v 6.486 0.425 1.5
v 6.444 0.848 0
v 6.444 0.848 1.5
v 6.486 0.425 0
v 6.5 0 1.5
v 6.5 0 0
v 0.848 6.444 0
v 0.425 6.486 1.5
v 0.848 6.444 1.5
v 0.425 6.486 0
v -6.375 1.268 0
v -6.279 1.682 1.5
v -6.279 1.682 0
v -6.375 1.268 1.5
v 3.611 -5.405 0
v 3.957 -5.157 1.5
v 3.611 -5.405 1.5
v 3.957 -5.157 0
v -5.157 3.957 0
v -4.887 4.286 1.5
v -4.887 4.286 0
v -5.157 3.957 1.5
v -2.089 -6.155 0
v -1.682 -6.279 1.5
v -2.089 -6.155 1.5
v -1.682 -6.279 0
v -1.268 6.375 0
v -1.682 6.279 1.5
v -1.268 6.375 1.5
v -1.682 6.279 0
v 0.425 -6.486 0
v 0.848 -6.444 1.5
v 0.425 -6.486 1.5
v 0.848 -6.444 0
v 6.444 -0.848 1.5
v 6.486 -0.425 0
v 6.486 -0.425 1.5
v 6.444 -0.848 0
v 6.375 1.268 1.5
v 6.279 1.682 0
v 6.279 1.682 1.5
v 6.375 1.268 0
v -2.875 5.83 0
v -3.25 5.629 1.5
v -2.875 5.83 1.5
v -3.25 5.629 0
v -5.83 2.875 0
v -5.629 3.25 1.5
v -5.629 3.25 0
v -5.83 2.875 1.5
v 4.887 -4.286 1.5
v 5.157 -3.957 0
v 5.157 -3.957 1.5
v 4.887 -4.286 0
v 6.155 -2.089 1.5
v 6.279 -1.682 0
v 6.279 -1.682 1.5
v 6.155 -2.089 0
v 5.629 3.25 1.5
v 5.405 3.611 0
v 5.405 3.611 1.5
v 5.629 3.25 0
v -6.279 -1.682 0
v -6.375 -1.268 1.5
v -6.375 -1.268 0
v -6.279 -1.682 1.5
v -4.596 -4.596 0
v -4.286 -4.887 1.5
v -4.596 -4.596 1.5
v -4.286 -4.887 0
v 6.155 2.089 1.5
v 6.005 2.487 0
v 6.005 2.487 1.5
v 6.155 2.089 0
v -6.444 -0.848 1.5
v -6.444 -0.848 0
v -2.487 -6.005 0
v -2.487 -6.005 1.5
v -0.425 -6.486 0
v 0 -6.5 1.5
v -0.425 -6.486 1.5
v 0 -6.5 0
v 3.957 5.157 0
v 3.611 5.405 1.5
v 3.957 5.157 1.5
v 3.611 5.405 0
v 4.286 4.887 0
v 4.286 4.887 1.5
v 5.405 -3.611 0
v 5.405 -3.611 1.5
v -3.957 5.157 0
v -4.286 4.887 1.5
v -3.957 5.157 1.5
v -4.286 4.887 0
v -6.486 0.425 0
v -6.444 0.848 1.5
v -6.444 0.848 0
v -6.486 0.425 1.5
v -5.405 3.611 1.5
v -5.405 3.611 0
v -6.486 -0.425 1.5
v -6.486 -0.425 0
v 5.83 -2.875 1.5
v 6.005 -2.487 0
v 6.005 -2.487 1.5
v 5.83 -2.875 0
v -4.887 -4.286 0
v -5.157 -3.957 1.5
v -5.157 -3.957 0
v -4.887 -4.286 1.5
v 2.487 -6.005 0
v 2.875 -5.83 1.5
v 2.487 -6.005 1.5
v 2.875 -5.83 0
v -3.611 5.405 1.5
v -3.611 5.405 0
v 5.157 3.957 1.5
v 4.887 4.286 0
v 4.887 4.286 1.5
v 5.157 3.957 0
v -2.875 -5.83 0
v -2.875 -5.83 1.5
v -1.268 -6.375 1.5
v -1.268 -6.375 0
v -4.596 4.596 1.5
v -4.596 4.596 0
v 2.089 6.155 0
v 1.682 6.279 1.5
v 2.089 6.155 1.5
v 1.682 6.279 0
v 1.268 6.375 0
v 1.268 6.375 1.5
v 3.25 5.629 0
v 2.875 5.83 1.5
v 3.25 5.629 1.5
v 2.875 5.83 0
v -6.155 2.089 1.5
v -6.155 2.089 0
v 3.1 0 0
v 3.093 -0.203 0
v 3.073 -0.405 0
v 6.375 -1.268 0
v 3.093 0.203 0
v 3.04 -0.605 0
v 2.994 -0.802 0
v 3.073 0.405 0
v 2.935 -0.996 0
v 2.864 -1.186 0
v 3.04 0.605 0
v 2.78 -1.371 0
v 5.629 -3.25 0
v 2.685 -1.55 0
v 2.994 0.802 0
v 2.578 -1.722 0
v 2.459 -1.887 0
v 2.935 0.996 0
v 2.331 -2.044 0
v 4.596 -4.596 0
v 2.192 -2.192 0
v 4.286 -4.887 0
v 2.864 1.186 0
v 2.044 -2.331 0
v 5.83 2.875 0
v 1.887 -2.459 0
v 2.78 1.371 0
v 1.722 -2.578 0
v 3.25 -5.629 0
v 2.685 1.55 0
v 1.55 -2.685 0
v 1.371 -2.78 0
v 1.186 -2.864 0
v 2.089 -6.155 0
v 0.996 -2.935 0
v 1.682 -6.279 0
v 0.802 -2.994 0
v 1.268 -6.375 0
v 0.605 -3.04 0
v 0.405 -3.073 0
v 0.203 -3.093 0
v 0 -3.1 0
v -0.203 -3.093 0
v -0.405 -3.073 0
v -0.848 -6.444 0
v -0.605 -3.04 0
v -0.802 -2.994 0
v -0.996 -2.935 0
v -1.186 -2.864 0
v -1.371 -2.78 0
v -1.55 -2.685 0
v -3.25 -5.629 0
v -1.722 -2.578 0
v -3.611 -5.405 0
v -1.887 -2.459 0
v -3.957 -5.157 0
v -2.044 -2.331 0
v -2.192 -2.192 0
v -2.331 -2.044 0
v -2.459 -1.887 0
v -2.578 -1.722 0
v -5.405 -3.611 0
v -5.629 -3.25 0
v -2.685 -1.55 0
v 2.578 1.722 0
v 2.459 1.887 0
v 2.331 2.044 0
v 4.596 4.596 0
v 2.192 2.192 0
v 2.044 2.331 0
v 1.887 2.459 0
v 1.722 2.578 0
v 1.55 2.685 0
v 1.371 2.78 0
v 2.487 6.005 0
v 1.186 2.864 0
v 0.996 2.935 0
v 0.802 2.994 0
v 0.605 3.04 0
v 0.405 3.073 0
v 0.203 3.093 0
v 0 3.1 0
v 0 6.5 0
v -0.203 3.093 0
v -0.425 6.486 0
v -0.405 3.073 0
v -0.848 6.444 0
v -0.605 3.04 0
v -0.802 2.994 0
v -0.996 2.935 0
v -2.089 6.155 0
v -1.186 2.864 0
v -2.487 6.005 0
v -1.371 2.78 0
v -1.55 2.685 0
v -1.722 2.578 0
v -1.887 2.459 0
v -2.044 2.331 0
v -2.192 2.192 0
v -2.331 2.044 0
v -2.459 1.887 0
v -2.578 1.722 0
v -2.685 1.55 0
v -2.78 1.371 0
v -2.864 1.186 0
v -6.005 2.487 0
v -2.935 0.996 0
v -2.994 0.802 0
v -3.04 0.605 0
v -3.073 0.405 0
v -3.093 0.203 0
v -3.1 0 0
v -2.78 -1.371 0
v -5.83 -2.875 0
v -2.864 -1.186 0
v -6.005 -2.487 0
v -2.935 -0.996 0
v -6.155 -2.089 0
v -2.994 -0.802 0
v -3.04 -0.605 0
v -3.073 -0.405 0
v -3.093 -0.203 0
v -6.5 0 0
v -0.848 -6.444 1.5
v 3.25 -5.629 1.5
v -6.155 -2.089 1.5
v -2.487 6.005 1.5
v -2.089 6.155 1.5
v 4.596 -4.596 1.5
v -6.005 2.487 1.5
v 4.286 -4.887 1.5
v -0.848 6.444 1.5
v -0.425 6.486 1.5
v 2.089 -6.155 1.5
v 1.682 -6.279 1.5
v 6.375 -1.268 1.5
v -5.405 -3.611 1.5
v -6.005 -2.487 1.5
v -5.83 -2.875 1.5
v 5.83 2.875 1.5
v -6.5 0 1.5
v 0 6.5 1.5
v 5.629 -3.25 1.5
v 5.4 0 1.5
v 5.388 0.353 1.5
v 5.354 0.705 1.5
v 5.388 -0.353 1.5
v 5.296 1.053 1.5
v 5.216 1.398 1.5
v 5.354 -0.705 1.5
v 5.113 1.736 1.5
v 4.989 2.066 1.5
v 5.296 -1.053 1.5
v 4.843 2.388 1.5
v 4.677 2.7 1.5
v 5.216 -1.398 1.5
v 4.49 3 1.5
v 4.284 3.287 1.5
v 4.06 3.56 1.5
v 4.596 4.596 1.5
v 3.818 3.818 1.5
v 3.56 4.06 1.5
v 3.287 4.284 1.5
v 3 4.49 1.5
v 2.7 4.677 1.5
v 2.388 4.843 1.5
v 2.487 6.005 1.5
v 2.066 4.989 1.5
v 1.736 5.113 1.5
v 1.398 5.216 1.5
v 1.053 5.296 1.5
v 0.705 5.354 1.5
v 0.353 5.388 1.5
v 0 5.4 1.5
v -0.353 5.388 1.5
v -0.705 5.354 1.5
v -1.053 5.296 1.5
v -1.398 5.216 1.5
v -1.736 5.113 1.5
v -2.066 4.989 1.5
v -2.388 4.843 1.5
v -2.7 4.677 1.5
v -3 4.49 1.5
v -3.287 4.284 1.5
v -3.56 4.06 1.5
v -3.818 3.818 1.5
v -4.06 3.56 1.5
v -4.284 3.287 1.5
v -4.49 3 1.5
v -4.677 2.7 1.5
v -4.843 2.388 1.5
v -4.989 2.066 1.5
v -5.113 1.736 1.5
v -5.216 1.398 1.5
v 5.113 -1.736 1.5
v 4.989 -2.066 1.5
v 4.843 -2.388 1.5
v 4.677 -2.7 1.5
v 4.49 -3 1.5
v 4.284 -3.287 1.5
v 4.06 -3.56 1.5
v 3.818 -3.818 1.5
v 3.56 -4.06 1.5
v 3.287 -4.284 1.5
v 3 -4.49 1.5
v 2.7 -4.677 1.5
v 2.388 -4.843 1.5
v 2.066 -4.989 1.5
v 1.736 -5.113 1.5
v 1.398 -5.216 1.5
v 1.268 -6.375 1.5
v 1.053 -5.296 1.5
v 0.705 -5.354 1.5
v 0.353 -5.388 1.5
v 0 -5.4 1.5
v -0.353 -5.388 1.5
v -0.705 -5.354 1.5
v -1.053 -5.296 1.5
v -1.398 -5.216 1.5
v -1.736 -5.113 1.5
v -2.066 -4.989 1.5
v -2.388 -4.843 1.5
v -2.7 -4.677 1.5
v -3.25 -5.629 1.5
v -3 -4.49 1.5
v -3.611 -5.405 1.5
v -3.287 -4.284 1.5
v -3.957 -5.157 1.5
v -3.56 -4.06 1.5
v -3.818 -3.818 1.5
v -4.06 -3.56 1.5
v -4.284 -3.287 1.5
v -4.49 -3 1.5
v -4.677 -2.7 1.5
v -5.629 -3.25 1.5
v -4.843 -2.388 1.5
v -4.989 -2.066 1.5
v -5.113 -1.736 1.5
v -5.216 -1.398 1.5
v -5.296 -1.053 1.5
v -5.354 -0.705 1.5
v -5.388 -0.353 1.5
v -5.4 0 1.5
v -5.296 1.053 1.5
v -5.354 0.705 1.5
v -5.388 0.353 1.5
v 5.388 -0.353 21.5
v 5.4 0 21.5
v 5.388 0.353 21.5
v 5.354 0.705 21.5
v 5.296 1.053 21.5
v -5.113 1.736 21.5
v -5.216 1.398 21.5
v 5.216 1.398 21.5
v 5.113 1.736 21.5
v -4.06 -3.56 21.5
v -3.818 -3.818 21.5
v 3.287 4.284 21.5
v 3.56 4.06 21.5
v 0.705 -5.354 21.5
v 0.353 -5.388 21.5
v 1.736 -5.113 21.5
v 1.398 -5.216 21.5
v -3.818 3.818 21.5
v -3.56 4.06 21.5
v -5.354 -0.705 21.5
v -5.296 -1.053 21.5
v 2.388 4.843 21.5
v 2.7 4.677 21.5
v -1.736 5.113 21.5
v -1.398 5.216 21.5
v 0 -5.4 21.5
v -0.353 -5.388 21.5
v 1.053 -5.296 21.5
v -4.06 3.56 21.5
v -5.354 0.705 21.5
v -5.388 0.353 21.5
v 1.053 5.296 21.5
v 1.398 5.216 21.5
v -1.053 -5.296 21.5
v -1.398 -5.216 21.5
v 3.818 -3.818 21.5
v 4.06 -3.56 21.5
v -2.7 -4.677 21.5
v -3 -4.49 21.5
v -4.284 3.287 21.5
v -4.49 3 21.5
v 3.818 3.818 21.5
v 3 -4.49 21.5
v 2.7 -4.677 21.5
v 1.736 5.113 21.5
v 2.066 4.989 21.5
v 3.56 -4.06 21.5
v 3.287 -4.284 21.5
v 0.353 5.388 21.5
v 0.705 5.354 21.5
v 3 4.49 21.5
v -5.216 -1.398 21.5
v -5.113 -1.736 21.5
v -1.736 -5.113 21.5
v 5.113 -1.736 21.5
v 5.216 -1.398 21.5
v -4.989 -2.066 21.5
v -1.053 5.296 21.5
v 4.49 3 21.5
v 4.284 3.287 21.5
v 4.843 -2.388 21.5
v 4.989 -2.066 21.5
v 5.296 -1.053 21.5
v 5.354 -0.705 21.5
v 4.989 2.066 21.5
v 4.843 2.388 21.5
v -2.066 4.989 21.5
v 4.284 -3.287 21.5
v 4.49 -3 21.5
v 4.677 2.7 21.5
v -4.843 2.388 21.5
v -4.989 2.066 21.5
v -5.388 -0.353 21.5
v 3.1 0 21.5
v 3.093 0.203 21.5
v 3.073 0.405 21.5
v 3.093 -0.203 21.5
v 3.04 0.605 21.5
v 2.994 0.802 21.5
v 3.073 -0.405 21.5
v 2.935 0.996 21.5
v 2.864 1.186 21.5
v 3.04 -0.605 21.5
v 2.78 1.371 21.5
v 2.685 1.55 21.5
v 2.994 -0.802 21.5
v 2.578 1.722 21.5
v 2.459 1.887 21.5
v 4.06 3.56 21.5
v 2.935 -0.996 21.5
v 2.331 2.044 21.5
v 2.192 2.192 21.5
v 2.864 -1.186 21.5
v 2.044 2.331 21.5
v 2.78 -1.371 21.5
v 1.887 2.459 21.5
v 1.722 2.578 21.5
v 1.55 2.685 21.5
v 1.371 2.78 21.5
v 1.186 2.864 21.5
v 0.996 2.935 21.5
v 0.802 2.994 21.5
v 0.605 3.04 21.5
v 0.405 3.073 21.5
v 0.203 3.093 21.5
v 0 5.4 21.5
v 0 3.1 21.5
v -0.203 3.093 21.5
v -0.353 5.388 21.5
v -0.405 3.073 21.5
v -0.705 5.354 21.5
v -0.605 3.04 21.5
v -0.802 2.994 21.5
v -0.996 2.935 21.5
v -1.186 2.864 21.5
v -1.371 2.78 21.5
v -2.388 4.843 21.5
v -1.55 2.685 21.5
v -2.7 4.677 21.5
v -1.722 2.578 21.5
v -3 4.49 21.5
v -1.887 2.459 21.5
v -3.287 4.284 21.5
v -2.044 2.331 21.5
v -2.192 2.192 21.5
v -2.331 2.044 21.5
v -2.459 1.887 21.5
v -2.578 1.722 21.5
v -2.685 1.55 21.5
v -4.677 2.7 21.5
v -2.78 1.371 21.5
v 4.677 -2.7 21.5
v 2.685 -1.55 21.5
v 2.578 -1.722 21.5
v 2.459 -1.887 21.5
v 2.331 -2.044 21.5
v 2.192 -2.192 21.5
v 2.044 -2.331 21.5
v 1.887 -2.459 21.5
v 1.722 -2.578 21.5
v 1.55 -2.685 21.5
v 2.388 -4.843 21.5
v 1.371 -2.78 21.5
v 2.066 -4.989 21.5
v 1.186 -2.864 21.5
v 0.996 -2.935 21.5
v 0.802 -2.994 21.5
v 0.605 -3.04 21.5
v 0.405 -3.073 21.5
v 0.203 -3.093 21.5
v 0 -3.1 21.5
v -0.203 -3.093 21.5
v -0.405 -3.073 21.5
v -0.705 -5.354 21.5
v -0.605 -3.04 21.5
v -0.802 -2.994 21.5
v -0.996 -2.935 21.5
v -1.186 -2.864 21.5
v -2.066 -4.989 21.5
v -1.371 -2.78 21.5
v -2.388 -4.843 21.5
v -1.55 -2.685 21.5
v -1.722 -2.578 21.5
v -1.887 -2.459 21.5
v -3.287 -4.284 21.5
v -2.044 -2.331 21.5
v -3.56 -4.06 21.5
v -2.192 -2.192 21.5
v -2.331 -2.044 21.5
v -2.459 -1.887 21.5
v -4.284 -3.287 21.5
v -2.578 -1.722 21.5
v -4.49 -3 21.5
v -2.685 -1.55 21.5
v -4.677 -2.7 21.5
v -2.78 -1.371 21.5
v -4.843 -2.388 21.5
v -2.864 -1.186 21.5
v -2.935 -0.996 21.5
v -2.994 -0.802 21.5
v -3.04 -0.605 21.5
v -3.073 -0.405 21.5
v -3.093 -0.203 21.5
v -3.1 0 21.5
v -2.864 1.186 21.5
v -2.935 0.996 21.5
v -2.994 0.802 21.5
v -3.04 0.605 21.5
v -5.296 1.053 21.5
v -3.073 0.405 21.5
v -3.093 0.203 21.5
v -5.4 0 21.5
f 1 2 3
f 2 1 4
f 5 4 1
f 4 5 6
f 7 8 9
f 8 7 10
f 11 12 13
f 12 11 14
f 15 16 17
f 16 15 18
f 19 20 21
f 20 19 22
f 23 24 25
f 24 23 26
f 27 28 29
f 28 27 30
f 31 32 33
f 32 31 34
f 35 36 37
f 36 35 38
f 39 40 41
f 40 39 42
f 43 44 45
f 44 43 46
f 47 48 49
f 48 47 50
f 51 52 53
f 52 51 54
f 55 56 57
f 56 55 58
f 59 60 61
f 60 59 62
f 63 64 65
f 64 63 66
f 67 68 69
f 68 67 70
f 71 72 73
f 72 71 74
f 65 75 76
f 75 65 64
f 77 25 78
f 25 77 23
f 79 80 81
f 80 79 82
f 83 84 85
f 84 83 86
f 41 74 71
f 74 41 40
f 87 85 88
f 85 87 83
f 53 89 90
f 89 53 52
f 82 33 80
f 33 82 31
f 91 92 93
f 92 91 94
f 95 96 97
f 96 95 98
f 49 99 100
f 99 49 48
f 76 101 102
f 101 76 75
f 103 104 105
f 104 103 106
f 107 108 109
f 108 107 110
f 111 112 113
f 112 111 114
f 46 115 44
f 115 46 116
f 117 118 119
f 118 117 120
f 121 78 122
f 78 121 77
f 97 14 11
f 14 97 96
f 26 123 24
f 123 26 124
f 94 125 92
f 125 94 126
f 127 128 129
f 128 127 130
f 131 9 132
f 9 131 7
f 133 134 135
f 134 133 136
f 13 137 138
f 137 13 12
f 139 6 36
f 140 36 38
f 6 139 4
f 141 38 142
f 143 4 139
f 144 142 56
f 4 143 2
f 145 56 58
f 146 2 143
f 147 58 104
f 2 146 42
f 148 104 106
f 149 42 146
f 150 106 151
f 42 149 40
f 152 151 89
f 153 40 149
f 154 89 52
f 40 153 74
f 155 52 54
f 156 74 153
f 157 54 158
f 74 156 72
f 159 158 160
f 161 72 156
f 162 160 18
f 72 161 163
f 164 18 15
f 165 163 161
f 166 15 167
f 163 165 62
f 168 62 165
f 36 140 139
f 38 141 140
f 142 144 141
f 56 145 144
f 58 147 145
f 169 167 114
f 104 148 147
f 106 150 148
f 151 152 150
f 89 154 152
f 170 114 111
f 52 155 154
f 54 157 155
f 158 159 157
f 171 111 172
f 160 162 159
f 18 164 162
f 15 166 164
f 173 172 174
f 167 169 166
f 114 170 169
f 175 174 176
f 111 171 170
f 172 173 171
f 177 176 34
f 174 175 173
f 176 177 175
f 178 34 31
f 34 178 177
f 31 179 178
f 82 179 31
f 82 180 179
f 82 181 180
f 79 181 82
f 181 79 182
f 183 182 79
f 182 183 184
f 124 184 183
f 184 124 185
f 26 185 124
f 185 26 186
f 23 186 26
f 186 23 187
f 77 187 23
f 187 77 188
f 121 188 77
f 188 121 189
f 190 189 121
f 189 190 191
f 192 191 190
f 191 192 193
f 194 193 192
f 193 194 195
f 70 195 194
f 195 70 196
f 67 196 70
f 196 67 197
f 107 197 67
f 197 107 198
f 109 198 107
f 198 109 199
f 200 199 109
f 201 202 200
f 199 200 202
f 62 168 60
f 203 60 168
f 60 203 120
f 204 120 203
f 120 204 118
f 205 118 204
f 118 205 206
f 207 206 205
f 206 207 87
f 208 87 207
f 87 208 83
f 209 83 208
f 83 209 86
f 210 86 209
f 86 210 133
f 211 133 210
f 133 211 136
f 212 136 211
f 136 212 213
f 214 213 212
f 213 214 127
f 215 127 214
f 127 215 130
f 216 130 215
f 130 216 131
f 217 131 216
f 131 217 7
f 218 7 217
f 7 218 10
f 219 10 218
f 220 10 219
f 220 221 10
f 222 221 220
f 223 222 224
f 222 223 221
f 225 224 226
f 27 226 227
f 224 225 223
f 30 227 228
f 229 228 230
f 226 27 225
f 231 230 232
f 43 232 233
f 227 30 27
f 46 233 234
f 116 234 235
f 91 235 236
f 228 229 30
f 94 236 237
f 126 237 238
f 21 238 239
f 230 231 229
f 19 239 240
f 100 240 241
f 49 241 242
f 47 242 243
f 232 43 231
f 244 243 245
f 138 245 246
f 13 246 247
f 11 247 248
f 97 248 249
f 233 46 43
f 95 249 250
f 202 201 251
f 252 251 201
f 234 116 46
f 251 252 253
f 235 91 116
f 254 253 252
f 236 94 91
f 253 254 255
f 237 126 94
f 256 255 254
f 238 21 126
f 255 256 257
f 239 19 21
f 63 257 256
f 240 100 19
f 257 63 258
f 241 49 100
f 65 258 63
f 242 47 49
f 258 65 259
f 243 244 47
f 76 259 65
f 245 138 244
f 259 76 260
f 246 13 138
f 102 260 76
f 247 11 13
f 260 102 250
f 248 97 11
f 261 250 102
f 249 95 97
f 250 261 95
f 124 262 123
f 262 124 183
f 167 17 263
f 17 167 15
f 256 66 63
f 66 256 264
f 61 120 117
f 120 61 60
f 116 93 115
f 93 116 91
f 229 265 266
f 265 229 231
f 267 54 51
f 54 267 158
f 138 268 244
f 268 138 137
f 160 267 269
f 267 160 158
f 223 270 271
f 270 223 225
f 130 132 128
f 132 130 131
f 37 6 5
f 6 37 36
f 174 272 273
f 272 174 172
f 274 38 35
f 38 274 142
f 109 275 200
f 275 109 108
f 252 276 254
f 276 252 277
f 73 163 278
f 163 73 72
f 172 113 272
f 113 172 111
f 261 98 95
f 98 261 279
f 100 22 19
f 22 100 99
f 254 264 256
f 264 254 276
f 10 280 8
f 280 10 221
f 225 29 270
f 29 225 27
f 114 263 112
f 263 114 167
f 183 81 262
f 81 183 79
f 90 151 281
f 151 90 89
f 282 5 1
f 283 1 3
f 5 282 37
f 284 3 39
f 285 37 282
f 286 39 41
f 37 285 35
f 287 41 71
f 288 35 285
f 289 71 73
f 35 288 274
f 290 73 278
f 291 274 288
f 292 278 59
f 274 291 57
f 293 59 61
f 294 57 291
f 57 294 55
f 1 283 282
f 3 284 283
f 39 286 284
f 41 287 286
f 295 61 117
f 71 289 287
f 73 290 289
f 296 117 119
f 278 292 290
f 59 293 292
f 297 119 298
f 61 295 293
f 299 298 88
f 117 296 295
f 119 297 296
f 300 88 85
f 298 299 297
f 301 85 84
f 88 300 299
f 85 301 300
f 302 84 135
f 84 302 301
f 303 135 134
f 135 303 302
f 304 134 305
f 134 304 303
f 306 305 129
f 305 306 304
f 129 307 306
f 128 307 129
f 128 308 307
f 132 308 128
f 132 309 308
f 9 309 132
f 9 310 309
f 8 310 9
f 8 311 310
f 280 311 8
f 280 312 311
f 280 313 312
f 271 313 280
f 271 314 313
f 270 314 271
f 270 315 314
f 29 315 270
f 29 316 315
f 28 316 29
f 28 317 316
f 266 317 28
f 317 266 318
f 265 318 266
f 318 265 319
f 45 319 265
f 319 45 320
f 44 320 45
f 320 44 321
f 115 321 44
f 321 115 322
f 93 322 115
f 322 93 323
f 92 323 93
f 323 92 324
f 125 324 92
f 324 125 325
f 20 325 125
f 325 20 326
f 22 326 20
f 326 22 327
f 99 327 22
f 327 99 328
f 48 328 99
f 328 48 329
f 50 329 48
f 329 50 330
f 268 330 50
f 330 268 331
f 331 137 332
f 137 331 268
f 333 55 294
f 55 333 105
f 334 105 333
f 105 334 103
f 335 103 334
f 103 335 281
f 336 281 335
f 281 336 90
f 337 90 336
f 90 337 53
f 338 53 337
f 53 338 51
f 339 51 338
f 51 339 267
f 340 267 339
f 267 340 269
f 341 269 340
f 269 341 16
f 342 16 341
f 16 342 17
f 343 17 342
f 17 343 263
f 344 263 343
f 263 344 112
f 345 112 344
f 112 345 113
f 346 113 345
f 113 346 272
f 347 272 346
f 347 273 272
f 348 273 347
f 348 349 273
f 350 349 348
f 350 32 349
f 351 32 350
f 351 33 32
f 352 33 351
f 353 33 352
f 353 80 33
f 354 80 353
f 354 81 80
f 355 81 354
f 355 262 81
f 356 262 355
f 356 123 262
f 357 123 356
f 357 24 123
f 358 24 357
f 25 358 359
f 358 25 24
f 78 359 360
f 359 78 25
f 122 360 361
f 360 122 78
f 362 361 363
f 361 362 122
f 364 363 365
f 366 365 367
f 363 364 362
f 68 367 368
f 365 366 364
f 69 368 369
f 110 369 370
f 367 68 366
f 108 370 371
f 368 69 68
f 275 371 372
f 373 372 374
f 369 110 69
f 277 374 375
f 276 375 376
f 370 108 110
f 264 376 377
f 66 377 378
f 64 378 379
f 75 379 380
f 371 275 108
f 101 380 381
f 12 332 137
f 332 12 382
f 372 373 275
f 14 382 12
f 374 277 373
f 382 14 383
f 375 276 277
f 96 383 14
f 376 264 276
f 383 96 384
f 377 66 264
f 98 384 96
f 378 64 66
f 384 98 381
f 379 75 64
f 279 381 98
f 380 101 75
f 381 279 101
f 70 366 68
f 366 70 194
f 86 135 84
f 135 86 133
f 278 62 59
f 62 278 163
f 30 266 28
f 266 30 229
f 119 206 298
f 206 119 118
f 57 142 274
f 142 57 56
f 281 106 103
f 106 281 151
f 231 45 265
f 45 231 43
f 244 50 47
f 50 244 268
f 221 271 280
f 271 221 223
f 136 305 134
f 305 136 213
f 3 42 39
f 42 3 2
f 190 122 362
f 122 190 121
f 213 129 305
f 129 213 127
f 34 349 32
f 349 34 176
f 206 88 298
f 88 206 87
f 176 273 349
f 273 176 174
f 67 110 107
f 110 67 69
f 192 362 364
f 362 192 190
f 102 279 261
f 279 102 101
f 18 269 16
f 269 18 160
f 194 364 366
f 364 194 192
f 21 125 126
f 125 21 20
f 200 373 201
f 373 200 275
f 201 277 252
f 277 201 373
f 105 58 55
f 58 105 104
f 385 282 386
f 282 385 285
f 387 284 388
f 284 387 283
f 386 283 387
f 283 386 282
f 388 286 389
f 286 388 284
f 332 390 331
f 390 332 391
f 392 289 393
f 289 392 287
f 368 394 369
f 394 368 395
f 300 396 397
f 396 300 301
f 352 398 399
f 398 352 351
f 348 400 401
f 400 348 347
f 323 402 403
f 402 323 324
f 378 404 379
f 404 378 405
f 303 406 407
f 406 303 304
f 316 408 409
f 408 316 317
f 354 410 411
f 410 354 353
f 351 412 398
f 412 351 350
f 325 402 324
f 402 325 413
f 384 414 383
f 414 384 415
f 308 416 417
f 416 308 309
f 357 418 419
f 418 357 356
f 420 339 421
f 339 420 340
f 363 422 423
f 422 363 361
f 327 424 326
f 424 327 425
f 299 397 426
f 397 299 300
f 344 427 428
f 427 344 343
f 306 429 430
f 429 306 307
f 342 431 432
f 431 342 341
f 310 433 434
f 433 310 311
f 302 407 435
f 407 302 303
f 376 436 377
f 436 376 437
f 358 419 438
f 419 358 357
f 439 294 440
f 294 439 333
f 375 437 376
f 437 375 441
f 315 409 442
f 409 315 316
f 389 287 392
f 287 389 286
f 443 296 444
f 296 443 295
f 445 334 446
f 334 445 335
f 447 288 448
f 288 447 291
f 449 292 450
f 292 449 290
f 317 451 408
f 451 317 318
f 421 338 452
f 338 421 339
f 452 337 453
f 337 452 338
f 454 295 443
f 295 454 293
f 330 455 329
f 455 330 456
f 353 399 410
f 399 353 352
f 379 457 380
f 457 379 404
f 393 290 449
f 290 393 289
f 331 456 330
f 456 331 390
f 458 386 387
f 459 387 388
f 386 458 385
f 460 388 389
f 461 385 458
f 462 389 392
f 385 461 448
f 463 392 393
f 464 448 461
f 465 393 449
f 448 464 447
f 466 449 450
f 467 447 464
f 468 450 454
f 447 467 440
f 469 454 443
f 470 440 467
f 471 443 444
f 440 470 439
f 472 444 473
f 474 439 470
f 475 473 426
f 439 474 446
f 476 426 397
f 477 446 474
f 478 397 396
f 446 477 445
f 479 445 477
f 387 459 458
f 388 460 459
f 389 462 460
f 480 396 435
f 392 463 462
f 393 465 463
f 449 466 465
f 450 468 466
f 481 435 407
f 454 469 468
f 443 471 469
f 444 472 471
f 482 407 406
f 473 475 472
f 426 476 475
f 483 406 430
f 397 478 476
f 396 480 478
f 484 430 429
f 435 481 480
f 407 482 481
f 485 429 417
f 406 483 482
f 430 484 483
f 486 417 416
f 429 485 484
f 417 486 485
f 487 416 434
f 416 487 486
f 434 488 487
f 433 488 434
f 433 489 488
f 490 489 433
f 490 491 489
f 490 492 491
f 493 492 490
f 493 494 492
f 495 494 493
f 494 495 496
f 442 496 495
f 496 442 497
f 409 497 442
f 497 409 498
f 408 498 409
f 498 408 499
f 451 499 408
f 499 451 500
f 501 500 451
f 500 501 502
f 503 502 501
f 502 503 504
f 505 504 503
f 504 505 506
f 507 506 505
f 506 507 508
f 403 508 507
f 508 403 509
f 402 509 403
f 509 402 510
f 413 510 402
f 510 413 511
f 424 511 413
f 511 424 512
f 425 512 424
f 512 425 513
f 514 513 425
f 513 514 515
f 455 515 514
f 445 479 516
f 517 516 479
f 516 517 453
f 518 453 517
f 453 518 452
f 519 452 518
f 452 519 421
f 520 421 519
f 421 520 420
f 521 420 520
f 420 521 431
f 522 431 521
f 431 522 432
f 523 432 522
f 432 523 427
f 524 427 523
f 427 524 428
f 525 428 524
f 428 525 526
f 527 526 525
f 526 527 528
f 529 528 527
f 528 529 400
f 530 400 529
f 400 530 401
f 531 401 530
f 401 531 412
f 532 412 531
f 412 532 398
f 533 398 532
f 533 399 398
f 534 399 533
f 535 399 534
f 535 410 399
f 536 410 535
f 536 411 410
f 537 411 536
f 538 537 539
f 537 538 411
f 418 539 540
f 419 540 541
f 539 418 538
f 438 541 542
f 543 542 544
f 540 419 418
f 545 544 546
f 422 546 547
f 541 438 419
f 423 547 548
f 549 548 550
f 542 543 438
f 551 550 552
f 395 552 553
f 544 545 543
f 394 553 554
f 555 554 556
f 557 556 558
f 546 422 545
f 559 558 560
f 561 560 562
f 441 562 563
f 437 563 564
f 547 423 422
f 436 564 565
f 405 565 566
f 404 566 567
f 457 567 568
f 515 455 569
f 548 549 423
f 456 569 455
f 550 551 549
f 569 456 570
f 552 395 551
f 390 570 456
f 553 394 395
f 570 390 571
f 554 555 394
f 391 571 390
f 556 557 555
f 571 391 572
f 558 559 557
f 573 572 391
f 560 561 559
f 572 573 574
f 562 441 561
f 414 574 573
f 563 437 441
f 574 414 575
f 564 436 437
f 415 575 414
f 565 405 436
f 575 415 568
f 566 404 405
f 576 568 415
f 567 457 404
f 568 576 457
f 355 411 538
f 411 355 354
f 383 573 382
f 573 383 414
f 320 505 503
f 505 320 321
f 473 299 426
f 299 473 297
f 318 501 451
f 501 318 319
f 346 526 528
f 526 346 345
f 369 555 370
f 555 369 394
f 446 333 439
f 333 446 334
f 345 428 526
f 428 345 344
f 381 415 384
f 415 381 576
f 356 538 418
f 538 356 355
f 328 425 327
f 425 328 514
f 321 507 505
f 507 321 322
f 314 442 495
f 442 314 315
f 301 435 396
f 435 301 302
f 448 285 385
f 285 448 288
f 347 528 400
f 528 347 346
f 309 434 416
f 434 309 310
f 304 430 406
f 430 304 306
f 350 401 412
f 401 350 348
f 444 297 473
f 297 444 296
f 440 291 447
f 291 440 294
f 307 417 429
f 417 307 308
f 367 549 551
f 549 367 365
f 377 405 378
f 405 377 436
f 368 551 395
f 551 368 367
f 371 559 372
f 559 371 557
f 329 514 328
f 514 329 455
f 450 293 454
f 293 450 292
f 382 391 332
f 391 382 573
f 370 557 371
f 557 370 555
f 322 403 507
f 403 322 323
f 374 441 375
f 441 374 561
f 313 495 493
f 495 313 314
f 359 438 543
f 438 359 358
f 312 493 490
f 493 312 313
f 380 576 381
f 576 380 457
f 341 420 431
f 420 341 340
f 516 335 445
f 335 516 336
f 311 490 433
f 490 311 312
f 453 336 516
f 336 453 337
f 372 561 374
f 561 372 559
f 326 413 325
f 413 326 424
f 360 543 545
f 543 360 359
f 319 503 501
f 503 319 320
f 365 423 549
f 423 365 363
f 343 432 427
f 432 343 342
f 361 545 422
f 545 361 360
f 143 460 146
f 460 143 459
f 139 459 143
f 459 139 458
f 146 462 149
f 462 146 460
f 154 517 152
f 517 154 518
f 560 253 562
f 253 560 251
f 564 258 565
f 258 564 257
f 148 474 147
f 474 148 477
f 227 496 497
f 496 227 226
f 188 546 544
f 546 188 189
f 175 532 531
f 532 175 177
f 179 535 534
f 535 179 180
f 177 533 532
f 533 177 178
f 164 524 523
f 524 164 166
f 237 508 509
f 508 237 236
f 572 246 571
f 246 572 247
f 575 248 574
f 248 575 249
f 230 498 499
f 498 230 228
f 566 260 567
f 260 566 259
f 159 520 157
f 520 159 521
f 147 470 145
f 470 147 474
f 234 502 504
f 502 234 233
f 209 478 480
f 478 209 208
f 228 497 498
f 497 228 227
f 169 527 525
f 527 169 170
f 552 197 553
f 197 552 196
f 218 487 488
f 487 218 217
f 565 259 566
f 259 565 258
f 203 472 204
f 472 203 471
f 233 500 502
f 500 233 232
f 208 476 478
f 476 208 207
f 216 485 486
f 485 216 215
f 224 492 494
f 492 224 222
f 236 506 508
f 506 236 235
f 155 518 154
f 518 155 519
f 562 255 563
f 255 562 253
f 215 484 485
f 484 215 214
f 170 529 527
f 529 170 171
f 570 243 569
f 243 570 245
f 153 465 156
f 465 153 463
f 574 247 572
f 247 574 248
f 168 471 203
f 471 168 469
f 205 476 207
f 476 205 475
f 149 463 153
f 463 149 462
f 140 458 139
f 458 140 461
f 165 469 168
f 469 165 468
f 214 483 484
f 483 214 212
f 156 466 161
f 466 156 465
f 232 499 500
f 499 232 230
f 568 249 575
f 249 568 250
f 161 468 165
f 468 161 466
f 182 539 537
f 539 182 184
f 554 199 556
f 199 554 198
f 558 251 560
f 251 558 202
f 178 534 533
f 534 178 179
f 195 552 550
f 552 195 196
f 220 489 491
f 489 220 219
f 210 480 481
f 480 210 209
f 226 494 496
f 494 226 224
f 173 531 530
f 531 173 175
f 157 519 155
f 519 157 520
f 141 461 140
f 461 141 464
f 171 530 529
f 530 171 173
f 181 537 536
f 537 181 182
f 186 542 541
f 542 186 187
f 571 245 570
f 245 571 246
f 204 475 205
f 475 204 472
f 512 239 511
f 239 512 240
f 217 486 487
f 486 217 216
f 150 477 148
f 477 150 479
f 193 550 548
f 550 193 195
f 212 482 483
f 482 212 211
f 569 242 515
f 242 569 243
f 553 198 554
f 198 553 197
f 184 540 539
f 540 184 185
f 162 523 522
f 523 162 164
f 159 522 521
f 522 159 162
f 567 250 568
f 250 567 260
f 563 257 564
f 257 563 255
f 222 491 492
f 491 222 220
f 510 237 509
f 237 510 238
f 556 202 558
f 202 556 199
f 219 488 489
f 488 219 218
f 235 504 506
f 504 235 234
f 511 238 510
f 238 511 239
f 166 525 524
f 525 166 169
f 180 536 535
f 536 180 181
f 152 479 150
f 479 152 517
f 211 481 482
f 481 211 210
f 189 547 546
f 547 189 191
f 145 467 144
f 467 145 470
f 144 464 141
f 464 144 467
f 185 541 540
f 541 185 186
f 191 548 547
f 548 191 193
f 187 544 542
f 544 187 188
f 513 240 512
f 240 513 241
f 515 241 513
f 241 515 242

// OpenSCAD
// Adapter sleeve: 0.2 mL PCR tube in a 1.5 mL rack hole
// Print orientation: collar down on the bed, sleeve body upward

// ---------- Dimensions (mm) ----------
collar_d      = 13;    // collar outer diameter
collar_h      = 1.5;   // collar thickness (z = 0 to 1.5)
sleeve_od     = 10.8;  // sleeve body outer diameter
sleeve_top_z  = 21.5;  // top of sleeve body
bore_d        = 6.2;   // through-bore diameter
eps           = 0.5;   // cutter overshoot past faces

$fn = 96;

// ---------- Model ----------
difference() {
    union() {
        // Collar
        cylinder(d = collar_d, h = collar_h);
        // Sleeve body (overlaps collar slightly for a clean union)
        translate([0, 0, collar_h - 0.01])
            cylinder(d = sleeve_od, h = sleeve_top_z - collar_h + 0.01);
    }
    // Full-height bore, open at both ends
    translate([0, 0, -eps])
        cylinder(d = bore_d, h = sleeve_top_z + 2 * eps);
}
